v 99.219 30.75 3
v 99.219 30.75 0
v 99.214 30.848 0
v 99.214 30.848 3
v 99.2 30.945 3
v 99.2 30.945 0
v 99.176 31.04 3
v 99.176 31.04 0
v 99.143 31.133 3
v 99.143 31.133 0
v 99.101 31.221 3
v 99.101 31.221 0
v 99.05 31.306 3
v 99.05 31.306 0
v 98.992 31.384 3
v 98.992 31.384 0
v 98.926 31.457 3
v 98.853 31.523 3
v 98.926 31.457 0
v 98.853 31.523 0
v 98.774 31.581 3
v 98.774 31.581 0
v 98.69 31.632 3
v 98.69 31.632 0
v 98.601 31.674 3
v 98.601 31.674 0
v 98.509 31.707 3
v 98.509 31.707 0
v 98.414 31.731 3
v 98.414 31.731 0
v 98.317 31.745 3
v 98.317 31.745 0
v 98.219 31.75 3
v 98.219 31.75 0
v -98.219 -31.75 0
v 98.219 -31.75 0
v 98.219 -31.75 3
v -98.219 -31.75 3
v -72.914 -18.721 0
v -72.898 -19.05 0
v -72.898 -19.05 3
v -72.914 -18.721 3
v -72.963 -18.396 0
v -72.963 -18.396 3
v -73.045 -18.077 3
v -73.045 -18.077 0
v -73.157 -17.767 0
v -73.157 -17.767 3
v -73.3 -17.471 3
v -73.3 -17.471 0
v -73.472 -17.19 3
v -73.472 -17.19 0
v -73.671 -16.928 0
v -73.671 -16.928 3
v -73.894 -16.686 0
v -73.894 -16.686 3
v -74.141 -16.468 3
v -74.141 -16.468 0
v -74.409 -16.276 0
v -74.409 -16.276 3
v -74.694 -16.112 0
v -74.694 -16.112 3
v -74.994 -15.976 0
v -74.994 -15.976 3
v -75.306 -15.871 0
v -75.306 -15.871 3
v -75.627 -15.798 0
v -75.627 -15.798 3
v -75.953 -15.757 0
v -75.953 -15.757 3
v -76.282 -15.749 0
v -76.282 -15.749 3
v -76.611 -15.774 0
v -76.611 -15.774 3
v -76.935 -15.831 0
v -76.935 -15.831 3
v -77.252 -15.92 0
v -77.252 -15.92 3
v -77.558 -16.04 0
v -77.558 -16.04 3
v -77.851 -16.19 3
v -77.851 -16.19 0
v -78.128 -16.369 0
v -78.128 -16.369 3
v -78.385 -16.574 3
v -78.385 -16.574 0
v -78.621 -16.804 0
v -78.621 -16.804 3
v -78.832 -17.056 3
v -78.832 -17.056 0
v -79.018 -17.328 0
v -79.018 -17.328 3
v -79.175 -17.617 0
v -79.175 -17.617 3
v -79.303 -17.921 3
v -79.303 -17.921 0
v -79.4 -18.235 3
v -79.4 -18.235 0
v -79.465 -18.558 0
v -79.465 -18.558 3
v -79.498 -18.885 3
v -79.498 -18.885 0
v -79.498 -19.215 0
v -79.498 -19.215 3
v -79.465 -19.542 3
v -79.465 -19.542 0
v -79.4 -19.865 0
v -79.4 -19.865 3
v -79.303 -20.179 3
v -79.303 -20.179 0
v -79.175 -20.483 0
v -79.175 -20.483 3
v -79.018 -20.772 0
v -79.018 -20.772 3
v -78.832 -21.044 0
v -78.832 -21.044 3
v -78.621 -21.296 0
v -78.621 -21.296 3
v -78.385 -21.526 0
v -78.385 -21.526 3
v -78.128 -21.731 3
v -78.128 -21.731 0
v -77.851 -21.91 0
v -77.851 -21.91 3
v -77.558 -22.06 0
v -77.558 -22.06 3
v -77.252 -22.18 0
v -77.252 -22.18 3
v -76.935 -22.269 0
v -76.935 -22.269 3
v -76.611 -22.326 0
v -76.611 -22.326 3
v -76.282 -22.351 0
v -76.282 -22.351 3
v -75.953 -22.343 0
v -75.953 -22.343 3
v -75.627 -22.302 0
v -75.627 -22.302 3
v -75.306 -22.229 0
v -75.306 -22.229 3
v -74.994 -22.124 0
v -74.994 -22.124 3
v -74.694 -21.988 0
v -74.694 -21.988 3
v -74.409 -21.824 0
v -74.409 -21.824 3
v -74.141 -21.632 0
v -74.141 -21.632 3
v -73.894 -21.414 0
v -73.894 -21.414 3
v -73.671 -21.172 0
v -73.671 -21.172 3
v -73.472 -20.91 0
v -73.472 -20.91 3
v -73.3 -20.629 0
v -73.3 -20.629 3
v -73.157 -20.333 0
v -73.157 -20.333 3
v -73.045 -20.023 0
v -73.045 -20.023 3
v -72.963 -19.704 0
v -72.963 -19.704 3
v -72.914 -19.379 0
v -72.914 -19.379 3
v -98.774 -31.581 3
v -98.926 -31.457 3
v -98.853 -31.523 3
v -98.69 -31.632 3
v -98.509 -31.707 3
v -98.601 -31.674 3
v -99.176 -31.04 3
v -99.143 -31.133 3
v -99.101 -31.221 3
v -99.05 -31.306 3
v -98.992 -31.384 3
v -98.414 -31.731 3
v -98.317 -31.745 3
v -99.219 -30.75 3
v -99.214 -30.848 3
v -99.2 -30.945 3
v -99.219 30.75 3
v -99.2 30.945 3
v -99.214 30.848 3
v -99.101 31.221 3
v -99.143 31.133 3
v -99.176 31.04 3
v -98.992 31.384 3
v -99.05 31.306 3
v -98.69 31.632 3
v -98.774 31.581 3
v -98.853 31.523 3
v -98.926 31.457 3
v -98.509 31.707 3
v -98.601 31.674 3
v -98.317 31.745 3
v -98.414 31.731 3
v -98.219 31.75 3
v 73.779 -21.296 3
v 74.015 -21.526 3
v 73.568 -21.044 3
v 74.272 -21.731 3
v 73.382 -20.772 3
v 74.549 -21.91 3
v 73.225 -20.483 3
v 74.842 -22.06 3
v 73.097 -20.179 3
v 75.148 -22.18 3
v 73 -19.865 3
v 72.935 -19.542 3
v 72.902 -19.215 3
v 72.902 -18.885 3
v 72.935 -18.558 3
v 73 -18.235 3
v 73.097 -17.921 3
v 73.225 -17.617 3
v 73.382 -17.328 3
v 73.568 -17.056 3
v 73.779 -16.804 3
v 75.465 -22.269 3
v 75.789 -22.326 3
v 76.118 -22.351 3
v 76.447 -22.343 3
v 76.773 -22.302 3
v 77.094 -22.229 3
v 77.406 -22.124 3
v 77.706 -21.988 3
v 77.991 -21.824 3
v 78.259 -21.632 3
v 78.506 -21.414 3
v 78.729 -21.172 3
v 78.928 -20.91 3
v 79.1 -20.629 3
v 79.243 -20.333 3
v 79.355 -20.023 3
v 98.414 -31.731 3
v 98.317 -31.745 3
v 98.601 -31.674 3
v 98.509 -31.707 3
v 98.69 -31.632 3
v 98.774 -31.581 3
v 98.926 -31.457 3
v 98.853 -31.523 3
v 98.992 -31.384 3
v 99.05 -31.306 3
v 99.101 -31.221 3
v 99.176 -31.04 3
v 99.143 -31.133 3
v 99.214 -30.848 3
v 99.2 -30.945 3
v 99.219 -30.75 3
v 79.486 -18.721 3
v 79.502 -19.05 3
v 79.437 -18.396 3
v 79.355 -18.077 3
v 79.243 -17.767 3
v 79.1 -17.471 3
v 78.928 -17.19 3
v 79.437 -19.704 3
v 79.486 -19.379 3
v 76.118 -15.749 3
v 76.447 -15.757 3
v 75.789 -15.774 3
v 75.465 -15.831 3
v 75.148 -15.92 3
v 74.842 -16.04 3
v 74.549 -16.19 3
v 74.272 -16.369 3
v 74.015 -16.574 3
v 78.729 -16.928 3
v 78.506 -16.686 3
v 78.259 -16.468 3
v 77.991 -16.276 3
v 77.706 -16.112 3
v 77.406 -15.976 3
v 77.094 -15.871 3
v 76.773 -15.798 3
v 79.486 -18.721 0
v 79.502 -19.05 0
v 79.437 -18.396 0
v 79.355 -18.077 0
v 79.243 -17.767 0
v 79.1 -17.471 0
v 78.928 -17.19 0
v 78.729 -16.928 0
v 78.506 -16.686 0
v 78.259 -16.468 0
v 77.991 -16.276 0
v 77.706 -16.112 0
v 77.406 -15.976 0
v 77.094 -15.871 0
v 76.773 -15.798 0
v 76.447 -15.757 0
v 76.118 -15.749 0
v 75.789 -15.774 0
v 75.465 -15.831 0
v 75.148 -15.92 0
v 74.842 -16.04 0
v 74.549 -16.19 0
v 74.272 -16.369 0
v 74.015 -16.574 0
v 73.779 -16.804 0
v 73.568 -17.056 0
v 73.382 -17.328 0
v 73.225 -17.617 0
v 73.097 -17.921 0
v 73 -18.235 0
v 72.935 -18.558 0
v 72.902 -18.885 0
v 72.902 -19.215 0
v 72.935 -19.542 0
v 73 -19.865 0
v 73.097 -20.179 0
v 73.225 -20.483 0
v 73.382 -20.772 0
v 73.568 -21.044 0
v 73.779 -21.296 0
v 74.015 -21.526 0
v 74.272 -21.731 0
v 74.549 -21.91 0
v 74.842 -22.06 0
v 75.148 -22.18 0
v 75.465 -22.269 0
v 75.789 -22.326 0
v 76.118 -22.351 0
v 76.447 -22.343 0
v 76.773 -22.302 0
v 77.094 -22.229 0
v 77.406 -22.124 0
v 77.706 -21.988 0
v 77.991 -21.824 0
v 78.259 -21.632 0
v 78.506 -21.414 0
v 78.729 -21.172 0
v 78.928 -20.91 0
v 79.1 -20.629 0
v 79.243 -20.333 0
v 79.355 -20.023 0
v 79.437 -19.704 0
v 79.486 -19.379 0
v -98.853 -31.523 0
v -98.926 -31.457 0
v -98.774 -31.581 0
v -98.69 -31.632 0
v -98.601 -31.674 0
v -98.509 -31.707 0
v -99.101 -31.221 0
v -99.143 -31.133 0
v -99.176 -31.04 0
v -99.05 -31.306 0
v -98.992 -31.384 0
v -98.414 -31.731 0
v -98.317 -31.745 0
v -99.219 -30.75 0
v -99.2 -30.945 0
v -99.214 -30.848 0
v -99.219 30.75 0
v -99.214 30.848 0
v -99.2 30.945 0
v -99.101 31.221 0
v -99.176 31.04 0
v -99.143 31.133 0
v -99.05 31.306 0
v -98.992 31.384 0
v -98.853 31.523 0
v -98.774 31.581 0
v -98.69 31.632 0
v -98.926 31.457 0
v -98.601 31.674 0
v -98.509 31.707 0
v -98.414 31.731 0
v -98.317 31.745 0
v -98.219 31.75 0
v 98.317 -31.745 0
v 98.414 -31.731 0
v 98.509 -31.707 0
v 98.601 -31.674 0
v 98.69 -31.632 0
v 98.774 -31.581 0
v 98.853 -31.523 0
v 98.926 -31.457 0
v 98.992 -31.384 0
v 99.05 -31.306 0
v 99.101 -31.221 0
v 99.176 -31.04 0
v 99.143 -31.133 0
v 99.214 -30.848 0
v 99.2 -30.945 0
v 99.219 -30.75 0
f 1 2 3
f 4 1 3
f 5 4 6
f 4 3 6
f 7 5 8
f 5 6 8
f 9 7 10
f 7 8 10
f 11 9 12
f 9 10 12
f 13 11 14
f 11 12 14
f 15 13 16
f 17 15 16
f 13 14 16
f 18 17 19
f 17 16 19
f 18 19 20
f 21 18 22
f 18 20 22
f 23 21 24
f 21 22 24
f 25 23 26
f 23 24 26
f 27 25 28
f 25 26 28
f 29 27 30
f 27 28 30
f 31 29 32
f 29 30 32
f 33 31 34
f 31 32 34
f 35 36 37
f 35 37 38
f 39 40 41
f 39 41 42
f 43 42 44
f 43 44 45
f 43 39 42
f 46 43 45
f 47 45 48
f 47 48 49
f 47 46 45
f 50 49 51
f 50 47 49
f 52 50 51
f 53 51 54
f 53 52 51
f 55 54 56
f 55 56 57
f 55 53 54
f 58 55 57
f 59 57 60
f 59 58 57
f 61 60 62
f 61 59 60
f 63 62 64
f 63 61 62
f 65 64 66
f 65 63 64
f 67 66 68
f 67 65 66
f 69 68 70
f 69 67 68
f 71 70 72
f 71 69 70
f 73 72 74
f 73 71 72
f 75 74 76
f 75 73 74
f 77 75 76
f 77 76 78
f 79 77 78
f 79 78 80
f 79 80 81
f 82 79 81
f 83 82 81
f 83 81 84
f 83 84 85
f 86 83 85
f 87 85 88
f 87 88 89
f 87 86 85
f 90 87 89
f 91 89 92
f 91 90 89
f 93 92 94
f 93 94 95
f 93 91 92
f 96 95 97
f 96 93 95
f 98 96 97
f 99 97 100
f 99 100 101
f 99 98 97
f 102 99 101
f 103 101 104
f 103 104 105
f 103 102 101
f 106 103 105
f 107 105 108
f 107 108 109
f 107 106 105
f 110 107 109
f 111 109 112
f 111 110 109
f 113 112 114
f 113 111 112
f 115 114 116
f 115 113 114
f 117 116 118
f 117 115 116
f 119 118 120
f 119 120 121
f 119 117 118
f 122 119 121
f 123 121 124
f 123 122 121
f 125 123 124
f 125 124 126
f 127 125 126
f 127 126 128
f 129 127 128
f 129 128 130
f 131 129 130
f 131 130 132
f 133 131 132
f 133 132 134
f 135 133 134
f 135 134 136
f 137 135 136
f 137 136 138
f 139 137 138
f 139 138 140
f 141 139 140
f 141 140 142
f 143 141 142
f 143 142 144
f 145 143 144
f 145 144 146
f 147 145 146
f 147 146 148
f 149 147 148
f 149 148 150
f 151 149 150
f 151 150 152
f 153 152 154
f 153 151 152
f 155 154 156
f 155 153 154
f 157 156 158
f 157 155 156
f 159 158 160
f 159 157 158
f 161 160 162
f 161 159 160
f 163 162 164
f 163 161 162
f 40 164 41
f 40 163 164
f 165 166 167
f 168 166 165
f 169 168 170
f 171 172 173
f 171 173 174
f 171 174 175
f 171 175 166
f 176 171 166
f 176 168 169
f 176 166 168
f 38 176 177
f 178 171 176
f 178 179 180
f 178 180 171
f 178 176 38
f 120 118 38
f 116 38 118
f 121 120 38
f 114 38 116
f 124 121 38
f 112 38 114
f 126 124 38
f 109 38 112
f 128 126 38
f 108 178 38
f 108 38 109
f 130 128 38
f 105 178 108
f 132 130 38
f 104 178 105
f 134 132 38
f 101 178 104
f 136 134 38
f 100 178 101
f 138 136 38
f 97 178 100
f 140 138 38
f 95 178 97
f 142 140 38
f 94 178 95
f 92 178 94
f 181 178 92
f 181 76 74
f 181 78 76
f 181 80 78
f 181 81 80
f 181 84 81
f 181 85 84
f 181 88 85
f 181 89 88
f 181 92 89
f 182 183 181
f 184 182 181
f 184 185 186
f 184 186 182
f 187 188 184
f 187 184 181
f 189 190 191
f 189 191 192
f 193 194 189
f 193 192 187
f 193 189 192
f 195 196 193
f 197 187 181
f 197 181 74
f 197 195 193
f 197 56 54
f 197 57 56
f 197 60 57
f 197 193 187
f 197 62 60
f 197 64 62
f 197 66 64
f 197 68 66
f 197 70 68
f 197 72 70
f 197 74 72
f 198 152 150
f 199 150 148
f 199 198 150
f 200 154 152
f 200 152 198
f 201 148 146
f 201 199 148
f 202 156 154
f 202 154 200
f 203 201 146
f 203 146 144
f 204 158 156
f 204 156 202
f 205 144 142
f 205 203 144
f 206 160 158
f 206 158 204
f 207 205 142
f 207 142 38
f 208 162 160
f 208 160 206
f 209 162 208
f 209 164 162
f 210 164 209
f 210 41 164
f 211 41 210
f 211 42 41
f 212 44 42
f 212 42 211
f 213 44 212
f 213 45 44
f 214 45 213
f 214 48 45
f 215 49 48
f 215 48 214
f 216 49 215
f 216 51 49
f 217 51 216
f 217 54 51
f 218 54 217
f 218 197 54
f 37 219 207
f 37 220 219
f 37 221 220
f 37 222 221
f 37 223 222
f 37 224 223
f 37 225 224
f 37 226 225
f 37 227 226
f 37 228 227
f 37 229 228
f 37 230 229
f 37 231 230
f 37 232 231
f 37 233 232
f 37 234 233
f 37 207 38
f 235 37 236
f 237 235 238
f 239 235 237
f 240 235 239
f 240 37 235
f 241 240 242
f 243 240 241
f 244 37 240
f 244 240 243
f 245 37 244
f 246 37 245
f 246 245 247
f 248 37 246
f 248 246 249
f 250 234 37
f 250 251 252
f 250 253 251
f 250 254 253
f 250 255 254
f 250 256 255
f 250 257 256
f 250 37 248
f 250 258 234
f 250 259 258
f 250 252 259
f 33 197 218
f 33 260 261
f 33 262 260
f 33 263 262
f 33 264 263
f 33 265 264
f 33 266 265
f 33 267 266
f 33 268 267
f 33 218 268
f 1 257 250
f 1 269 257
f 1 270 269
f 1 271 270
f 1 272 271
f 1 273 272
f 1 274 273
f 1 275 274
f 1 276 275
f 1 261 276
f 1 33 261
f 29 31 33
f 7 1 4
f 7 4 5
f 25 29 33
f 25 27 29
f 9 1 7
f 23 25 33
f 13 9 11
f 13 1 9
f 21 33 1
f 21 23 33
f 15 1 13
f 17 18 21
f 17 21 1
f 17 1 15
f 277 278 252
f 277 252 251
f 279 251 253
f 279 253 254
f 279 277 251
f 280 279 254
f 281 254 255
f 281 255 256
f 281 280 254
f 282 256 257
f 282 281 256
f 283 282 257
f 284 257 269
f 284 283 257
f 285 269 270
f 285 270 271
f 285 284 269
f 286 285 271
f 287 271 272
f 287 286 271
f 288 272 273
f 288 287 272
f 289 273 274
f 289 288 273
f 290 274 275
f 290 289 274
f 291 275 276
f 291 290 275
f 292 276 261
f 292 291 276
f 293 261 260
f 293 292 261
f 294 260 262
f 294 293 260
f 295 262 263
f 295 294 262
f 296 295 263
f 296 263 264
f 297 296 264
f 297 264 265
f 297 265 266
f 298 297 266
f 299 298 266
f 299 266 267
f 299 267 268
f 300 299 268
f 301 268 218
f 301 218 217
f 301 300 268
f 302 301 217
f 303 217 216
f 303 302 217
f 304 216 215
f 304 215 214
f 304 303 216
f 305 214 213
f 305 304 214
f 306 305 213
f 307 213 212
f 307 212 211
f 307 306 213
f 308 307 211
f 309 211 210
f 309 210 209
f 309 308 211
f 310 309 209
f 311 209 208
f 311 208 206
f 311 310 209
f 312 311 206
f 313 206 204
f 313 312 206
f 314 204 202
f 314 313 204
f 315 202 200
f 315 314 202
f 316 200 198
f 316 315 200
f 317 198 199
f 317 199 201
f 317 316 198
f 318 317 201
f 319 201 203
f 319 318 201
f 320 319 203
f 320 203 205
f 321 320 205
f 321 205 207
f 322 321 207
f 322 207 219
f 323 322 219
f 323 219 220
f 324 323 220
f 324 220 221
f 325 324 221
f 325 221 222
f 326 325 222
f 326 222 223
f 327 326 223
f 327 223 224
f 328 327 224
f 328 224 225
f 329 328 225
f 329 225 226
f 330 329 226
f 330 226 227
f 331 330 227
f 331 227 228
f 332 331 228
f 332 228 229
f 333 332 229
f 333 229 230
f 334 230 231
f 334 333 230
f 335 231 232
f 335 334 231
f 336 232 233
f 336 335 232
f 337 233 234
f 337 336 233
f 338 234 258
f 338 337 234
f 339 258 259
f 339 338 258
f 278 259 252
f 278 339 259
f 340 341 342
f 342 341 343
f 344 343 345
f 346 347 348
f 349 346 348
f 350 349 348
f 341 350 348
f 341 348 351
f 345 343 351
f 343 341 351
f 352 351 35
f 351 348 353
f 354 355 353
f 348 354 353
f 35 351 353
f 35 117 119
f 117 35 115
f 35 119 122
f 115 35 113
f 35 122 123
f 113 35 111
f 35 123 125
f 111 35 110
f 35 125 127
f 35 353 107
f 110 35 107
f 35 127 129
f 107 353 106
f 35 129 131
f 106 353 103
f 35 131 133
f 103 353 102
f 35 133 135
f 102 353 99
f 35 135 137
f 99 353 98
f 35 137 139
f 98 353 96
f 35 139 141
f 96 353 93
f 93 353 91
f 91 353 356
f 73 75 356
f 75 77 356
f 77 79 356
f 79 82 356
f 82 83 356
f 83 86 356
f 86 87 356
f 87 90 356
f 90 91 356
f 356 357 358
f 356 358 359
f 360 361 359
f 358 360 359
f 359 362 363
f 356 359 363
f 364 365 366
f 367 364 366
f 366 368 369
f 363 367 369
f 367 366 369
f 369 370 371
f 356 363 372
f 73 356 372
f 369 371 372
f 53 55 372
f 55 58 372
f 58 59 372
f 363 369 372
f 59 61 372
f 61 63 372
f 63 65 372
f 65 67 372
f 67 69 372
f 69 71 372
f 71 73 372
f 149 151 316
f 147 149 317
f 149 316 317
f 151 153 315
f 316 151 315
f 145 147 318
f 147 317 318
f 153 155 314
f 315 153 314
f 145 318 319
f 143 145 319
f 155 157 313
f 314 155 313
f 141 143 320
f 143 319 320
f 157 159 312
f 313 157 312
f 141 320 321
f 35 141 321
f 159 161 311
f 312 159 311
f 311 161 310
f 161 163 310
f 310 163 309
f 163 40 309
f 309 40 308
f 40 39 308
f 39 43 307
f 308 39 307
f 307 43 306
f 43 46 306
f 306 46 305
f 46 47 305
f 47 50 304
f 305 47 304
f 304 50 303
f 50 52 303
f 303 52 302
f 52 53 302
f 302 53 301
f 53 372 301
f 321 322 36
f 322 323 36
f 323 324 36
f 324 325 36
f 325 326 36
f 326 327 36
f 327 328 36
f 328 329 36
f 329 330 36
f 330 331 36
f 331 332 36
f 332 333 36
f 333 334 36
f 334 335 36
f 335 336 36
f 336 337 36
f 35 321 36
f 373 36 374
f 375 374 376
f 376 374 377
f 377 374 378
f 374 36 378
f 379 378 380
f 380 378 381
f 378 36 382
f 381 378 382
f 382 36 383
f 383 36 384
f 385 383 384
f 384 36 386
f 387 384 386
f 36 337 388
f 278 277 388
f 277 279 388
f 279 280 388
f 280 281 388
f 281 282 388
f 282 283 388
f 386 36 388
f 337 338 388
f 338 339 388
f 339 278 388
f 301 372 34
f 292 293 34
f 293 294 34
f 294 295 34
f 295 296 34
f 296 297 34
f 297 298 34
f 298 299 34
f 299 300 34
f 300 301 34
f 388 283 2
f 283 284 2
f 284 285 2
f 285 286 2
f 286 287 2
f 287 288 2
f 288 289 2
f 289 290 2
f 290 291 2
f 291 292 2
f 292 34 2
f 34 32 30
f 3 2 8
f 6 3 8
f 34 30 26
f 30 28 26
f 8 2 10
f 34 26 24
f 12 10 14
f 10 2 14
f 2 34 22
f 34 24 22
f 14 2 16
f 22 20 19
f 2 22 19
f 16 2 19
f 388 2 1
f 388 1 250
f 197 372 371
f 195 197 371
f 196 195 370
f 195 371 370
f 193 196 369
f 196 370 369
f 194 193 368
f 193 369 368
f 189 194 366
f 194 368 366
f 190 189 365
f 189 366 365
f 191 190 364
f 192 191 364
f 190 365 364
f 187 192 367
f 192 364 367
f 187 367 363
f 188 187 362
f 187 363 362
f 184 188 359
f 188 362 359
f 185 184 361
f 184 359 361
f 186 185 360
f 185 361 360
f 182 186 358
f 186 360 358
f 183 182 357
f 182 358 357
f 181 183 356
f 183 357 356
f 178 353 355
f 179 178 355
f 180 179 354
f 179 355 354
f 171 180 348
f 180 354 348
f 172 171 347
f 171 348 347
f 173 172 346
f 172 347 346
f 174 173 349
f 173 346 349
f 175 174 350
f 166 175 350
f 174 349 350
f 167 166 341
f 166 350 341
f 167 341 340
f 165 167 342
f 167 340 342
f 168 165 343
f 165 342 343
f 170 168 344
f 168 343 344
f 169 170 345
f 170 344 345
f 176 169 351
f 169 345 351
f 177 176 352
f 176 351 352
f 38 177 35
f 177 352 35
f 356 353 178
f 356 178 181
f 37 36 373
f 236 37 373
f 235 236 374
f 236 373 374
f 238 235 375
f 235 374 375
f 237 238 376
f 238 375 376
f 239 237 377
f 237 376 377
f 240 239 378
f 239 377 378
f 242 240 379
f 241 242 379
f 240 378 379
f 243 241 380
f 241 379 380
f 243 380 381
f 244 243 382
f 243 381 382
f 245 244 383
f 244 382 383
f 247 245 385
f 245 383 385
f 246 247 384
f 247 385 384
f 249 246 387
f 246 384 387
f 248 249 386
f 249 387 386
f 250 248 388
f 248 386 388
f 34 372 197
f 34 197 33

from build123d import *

# Parameters (mm, degrees)
SKETCH_R  = 3.302
PAD_DEPTH = 3


with BuildPart() as part:
    # Sketch → Pad (new body)
    with BuildSketch(Plane.XY):
        with BuildLine():
            ThreePointArc((-98.21875, 31.75), (-98.925857, 31.457107), (-99.21875, 30.75))
            Line((-99.21875, -30.75), (-99.21875, 30.75))
            ThreePointArc((-99.21875, -30.75), (-98.925857, -31.457107), (-98.21875, -31.75))
            Line((98.21875, -31.75), (-98.21875, -31.75))
            ThreePointArc((98.21875, -31.75), (98.925857, -31.457107), (99.21875, -30.75))
            Line((99.21875, 30.75), (99.21875, -30.75))
            ThreePointArc((99.21875, 30.75), (98.925857, 31.457107), (98.21875, 31.75))
            Line((-98.21875, 31.75), (98.21875, 31.75))
        make_face()
        with Locations((-76.2, -19.05)):
            Circle(SKETCH_R, mode=Mode.SUBTRACT)
        with Locations((76.2, -19.05)):
            Circle(SKETCH_R, mode=Mode.SUBTRACT)
    extrude(amount=PAD_DEPTH)


solid = part.part
